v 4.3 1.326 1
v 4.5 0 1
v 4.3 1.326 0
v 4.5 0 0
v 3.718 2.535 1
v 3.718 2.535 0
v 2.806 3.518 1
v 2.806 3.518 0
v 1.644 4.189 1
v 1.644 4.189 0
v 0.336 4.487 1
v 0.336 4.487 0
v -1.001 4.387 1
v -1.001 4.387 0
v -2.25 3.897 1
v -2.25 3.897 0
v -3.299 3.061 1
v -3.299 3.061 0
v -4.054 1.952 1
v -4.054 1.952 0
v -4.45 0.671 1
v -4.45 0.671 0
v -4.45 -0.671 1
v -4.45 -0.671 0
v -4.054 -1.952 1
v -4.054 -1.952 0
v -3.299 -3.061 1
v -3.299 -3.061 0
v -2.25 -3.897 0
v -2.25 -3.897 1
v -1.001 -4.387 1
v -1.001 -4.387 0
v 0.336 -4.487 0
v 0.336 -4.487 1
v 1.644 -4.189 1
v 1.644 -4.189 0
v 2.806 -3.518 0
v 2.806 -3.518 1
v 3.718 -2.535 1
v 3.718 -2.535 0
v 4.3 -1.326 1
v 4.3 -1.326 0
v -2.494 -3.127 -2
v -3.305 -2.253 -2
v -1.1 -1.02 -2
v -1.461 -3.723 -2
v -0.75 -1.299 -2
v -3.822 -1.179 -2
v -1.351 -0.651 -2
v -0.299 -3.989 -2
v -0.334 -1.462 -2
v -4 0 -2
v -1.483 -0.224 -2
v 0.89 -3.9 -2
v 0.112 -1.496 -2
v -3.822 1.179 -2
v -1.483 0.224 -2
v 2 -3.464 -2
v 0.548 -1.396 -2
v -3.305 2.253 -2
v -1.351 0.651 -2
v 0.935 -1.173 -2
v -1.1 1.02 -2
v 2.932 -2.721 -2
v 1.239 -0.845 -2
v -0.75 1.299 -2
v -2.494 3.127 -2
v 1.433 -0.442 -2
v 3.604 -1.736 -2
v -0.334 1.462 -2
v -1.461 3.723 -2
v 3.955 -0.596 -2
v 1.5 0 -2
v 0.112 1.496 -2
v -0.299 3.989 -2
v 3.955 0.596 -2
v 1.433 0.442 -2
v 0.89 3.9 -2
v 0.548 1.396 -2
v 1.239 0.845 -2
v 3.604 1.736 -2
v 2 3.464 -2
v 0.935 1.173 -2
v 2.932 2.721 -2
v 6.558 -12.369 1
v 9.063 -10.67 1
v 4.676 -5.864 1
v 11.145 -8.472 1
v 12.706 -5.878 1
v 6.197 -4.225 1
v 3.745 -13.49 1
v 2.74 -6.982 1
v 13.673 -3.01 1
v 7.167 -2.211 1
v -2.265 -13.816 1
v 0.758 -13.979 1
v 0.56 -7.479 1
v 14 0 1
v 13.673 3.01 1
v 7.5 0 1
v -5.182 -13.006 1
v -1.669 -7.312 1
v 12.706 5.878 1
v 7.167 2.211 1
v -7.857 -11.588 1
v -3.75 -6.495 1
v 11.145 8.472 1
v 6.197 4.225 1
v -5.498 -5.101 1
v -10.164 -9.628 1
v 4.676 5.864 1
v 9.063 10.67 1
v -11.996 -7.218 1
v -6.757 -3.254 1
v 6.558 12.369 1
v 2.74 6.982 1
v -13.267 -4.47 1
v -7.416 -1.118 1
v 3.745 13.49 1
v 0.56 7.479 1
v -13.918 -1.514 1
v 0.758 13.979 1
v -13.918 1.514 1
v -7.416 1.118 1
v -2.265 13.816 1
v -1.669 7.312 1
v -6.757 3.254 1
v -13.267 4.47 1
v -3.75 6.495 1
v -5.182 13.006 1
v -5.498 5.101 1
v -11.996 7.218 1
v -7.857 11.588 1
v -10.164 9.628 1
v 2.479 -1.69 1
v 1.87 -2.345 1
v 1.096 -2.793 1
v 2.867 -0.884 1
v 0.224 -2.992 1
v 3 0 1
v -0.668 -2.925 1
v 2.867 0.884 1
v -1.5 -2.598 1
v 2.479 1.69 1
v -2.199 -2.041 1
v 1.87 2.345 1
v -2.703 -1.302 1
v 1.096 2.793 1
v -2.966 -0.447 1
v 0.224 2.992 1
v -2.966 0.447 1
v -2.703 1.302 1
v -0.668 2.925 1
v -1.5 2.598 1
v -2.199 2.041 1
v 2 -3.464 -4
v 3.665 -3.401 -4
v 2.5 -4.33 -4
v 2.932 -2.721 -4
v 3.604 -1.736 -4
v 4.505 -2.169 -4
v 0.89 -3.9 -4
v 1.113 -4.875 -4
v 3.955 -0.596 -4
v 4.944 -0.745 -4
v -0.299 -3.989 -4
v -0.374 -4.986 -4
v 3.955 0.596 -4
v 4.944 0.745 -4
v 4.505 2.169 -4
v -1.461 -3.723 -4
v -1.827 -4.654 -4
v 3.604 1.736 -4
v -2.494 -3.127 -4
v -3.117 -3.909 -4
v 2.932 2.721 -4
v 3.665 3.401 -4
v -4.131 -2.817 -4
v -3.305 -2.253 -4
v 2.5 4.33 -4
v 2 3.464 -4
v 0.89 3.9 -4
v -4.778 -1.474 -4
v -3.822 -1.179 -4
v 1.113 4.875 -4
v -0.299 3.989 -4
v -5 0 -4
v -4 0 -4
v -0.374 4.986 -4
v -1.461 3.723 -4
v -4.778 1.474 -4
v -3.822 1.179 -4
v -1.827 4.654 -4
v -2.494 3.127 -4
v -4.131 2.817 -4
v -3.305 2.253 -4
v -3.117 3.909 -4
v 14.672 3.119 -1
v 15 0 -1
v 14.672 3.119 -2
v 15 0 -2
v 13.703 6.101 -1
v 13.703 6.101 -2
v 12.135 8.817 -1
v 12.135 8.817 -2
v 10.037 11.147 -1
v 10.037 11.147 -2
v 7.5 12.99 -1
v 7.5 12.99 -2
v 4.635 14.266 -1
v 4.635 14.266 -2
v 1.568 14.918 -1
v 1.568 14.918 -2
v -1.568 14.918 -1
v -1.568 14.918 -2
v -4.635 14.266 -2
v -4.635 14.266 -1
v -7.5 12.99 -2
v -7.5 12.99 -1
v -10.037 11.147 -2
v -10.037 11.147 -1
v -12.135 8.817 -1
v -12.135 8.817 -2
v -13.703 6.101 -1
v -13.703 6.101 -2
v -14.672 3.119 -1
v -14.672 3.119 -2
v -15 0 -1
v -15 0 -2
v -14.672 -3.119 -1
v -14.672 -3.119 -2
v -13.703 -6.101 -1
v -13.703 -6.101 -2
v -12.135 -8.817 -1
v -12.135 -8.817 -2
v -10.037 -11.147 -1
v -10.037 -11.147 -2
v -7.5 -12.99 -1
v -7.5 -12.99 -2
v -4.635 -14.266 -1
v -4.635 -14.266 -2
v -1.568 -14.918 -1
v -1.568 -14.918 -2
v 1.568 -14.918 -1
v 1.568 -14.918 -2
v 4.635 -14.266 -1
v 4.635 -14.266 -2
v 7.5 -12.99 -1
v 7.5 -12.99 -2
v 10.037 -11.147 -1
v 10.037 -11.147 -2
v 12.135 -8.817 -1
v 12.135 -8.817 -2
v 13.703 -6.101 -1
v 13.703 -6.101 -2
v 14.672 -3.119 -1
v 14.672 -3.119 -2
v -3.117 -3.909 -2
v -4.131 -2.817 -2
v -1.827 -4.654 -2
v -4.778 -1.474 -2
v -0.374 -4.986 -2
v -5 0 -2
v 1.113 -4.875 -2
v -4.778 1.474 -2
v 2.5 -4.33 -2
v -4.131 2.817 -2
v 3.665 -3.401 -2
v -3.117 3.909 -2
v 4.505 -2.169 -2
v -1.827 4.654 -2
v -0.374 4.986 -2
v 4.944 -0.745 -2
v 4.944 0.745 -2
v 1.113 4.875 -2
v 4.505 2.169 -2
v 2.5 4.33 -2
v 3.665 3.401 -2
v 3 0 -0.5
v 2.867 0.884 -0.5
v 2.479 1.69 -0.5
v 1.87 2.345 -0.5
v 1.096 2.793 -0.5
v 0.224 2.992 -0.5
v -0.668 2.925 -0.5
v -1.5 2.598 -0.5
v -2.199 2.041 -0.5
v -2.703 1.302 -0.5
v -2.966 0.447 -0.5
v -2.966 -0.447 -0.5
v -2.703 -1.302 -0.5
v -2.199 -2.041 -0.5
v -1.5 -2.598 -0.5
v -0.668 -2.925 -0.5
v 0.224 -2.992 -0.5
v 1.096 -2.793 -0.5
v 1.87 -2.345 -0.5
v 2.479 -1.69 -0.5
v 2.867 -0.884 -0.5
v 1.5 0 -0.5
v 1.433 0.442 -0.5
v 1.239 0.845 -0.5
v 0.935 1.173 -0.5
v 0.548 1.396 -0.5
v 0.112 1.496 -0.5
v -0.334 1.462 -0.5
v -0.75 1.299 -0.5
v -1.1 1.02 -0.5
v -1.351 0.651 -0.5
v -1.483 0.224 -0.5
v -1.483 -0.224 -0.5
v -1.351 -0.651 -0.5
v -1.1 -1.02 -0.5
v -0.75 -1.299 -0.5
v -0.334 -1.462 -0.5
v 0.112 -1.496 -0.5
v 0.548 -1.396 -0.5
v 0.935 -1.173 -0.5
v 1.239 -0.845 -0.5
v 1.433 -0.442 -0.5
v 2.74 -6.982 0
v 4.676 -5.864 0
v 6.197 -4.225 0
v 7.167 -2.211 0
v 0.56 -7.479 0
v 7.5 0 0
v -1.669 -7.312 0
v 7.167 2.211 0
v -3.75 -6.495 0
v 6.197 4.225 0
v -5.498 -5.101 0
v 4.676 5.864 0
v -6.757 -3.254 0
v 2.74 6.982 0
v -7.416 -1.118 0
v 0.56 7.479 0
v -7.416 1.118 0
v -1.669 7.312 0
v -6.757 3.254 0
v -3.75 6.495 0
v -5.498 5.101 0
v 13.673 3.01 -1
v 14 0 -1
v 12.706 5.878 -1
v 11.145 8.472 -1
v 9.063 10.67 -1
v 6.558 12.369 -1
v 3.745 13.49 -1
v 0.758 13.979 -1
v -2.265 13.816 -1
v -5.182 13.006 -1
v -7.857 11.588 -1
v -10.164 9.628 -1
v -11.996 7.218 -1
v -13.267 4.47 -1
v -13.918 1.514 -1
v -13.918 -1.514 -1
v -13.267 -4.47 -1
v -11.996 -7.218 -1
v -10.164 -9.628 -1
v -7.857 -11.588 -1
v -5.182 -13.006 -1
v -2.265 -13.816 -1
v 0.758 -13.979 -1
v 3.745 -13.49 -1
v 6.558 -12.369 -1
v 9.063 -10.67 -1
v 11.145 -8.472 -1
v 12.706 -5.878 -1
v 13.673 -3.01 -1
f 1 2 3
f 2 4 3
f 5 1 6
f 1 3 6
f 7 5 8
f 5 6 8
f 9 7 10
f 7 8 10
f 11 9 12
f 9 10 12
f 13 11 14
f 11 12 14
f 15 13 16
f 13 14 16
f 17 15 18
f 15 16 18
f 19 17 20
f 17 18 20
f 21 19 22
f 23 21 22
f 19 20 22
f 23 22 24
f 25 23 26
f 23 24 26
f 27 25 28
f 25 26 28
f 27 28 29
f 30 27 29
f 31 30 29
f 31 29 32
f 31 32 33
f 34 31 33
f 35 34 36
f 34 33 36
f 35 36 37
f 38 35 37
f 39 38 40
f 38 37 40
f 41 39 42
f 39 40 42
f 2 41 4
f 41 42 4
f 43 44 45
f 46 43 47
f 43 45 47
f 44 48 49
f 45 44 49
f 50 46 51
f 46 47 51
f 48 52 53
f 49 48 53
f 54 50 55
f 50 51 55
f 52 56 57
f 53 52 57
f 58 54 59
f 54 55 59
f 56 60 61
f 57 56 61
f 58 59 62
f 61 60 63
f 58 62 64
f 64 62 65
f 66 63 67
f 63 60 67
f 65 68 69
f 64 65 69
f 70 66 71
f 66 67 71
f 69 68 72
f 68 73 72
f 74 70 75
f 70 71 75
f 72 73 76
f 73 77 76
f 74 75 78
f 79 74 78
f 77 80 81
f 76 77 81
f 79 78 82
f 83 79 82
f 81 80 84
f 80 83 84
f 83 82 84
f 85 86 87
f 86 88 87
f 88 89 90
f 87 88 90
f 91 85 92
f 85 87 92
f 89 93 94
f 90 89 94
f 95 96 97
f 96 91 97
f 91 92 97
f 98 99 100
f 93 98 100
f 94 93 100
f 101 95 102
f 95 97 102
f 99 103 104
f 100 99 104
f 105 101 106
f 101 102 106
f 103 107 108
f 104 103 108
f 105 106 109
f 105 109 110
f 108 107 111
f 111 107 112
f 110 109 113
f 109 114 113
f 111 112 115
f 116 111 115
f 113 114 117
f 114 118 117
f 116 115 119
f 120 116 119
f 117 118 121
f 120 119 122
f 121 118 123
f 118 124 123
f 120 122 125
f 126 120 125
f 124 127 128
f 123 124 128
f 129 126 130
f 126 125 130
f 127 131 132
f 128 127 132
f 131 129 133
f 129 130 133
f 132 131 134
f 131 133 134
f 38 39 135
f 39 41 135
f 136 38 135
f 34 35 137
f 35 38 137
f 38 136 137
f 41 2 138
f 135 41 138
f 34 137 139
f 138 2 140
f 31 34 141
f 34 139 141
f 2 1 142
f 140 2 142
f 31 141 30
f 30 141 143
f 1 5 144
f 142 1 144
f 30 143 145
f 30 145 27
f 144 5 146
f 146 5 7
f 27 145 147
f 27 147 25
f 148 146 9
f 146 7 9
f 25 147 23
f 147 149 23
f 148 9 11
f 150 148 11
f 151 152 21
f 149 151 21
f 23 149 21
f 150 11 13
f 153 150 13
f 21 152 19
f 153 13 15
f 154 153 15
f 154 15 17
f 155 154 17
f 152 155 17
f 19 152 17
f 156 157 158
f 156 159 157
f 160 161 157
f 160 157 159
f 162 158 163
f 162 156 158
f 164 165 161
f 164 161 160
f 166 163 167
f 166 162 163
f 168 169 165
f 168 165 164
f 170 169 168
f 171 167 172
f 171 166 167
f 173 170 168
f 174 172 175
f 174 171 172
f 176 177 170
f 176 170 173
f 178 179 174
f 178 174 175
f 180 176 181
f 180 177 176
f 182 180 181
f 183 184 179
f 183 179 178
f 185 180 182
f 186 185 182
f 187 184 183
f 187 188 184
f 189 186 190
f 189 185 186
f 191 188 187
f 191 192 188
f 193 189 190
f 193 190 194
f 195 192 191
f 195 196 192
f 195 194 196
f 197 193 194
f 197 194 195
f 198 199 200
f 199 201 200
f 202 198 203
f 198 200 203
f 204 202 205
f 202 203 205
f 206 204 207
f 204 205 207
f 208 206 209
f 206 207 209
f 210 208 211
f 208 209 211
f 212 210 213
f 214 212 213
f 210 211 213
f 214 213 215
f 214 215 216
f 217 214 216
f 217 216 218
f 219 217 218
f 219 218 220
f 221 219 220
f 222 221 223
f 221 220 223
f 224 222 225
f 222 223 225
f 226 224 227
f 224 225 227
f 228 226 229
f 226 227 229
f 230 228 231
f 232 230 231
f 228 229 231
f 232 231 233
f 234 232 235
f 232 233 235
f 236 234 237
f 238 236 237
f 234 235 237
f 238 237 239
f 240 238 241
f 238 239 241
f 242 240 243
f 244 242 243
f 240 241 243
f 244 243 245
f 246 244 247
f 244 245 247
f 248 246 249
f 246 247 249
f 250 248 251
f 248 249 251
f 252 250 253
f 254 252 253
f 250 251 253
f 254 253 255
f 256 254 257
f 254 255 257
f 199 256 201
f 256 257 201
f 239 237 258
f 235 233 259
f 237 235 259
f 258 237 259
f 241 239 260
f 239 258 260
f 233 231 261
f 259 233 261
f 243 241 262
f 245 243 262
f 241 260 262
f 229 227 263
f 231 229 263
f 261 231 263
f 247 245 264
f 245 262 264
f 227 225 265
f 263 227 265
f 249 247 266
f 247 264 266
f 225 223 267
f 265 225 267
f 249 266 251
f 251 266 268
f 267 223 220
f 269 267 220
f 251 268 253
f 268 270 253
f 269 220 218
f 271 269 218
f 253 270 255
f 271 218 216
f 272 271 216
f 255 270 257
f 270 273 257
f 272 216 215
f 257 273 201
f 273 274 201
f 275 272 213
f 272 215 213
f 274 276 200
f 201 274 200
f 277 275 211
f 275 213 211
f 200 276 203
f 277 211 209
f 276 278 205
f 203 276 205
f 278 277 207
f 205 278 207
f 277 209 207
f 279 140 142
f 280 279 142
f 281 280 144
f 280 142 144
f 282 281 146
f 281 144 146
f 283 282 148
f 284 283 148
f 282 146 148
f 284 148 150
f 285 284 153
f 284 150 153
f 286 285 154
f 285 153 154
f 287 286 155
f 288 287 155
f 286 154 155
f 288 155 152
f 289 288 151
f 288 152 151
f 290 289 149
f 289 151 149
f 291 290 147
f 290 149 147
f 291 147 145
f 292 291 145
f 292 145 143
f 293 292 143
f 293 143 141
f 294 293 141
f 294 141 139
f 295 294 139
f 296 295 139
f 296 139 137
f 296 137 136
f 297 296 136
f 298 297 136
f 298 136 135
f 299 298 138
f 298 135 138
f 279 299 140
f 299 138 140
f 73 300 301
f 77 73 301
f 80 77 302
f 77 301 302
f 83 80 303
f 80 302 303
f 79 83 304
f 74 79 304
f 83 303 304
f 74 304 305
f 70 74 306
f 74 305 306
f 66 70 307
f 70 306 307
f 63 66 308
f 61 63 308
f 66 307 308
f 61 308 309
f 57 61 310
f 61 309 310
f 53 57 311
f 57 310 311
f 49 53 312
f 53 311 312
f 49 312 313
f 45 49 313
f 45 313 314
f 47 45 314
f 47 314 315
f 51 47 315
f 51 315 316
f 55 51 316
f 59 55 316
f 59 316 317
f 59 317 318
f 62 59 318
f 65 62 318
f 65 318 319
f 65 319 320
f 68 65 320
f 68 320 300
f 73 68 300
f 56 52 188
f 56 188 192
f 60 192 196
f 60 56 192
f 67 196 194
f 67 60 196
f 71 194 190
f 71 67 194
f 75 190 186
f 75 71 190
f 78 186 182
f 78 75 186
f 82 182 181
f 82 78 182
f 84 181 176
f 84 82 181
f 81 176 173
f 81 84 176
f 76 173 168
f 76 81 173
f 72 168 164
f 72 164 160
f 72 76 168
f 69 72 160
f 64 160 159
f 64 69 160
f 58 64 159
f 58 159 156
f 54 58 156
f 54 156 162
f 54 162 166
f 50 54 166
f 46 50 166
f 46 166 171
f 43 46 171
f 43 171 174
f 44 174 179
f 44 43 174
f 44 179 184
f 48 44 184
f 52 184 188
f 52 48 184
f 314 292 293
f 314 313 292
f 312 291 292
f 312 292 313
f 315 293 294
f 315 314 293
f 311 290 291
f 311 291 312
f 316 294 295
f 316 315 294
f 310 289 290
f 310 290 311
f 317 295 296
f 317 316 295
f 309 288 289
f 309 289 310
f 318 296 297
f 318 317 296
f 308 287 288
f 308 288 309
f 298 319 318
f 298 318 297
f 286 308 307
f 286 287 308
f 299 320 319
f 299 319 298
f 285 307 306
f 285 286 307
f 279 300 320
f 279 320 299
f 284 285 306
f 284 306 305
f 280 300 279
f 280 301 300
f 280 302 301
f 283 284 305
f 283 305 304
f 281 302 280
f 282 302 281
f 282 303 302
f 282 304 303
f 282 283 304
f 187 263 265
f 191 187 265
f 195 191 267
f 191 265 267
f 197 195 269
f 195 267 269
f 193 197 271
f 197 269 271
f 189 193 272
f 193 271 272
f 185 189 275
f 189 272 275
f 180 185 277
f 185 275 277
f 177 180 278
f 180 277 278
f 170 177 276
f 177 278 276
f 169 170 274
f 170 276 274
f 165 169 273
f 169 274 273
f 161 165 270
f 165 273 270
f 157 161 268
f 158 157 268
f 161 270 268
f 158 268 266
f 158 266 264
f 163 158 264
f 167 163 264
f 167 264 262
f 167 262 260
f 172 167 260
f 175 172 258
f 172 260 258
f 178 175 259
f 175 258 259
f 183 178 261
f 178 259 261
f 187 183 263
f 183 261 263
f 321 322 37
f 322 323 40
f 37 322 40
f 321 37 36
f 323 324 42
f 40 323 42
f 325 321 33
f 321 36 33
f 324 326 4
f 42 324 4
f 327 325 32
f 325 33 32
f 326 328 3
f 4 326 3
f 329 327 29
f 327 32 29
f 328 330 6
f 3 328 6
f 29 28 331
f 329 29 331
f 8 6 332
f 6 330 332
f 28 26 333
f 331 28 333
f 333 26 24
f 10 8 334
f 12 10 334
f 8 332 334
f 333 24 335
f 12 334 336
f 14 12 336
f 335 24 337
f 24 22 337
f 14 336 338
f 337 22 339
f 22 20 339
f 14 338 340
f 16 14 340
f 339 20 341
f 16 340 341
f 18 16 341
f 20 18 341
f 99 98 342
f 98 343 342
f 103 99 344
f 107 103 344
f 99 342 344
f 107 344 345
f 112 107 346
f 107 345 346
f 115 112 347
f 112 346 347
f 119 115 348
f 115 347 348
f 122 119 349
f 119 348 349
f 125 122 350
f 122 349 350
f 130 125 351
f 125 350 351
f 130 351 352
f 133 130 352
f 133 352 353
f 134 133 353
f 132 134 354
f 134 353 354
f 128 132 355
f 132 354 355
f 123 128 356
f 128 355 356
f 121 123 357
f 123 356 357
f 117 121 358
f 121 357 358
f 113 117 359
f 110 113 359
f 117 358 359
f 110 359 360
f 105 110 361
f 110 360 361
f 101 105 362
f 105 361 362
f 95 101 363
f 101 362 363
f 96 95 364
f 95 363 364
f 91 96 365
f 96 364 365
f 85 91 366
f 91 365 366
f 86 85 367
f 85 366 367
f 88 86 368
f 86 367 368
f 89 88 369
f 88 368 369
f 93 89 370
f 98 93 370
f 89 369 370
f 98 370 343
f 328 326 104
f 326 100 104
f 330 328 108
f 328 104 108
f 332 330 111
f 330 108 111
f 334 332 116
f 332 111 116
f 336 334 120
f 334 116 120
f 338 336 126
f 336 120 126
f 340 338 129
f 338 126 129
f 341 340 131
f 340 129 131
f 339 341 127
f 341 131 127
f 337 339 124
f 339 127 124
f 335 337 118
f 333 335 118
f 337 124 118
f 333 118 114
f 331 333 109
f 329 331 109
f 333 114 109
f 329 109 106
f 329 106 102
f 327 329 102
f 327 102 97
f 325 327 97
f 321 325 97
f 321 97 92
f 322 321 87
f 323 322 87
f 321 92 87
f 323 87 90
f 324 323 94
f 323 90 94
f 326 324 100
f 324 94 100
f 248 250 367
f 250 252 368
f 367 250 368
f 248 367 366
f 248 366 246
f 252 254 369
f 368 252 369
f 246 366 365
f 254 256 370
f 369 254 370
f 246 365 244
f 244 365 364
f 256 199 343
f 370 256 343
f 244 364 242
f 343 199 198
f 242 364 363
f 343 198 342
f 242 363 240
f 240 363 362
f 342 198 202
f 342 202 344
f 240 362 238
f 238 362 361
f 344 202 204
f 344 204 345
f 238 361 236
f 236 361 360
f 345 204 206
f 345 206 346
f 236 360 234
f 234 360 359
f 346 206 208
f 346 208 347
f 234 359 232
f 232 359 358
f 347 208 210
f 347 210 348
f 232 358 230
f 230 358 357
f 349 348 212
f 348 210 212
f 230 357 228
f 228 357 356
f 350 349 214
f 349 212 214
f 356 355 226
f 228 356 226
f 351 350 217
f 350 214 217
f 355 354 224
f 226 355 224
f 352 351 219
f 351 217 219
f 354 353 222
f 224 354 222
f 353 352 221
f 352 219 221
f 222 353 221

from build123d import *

# Parameters (mm, degrees)
SKETCH3_R           = 3
CUT_EXTRUDE1_DEPTH  = 1.5
SKETCH4_R           = 1.5
CUT_EXTRUDE2_DEPTH  = 2.5
SKETCH5_R           = 5
SKETCH5_R_2         = 4
EXTRUDE_THIN1_DEPTH = 2


with BuildPart() as part:
    # Sketch1 → Revolve1 (revolve)
    with BuildSketch(Plane(origin=(0, 0, 0), x_dir=(1, 0, 0), z_dir=(0, 1, 0))):
        Polygon((0, -1), (4.5, -1), (4.5, 0), (7.5, 0), (7.5, -1), (14, -1), (14, 1), (15, 1), (15, 2), (0, 2), align=None)
    revolve(axis=Axis((0, 0, -2), (0, 0, 1)))

    # Sketch3 → Cut-Extrude1 (cut)
    with BuildSketch(Plane.XY.offset(1)):
        Circle(SKETCH3_R)
    extrude(amount=-CUT_EXTRUDE1_DEPTH, mode=Mode.SUBTRACT)

    # Sketch4 → Cut-Extrude2 (cut, through all)
    with BuildSketch(Plane.XY.offset(-0.5)):
        Circle(SKETCH4_R)
    extrude(amount=-CUT_EXTRUDE2_DEPTH, mode=Mode.SUBTRACT)

    # Sketch5 → Extrude-Thin1 (add)
    with BuildSketch(Plane(origin=(0, 0, -2), x_dir=(-1, 0, 0), z_dir=(0, 0, -1))):
        Circle(SKETCH5_R)
        Circle(SKETCH5_R_2, mode=Mode.SUBTRACT)
    extrude(amount=EXTRUDE_THIN1_DEPTH)


solid = part.part
